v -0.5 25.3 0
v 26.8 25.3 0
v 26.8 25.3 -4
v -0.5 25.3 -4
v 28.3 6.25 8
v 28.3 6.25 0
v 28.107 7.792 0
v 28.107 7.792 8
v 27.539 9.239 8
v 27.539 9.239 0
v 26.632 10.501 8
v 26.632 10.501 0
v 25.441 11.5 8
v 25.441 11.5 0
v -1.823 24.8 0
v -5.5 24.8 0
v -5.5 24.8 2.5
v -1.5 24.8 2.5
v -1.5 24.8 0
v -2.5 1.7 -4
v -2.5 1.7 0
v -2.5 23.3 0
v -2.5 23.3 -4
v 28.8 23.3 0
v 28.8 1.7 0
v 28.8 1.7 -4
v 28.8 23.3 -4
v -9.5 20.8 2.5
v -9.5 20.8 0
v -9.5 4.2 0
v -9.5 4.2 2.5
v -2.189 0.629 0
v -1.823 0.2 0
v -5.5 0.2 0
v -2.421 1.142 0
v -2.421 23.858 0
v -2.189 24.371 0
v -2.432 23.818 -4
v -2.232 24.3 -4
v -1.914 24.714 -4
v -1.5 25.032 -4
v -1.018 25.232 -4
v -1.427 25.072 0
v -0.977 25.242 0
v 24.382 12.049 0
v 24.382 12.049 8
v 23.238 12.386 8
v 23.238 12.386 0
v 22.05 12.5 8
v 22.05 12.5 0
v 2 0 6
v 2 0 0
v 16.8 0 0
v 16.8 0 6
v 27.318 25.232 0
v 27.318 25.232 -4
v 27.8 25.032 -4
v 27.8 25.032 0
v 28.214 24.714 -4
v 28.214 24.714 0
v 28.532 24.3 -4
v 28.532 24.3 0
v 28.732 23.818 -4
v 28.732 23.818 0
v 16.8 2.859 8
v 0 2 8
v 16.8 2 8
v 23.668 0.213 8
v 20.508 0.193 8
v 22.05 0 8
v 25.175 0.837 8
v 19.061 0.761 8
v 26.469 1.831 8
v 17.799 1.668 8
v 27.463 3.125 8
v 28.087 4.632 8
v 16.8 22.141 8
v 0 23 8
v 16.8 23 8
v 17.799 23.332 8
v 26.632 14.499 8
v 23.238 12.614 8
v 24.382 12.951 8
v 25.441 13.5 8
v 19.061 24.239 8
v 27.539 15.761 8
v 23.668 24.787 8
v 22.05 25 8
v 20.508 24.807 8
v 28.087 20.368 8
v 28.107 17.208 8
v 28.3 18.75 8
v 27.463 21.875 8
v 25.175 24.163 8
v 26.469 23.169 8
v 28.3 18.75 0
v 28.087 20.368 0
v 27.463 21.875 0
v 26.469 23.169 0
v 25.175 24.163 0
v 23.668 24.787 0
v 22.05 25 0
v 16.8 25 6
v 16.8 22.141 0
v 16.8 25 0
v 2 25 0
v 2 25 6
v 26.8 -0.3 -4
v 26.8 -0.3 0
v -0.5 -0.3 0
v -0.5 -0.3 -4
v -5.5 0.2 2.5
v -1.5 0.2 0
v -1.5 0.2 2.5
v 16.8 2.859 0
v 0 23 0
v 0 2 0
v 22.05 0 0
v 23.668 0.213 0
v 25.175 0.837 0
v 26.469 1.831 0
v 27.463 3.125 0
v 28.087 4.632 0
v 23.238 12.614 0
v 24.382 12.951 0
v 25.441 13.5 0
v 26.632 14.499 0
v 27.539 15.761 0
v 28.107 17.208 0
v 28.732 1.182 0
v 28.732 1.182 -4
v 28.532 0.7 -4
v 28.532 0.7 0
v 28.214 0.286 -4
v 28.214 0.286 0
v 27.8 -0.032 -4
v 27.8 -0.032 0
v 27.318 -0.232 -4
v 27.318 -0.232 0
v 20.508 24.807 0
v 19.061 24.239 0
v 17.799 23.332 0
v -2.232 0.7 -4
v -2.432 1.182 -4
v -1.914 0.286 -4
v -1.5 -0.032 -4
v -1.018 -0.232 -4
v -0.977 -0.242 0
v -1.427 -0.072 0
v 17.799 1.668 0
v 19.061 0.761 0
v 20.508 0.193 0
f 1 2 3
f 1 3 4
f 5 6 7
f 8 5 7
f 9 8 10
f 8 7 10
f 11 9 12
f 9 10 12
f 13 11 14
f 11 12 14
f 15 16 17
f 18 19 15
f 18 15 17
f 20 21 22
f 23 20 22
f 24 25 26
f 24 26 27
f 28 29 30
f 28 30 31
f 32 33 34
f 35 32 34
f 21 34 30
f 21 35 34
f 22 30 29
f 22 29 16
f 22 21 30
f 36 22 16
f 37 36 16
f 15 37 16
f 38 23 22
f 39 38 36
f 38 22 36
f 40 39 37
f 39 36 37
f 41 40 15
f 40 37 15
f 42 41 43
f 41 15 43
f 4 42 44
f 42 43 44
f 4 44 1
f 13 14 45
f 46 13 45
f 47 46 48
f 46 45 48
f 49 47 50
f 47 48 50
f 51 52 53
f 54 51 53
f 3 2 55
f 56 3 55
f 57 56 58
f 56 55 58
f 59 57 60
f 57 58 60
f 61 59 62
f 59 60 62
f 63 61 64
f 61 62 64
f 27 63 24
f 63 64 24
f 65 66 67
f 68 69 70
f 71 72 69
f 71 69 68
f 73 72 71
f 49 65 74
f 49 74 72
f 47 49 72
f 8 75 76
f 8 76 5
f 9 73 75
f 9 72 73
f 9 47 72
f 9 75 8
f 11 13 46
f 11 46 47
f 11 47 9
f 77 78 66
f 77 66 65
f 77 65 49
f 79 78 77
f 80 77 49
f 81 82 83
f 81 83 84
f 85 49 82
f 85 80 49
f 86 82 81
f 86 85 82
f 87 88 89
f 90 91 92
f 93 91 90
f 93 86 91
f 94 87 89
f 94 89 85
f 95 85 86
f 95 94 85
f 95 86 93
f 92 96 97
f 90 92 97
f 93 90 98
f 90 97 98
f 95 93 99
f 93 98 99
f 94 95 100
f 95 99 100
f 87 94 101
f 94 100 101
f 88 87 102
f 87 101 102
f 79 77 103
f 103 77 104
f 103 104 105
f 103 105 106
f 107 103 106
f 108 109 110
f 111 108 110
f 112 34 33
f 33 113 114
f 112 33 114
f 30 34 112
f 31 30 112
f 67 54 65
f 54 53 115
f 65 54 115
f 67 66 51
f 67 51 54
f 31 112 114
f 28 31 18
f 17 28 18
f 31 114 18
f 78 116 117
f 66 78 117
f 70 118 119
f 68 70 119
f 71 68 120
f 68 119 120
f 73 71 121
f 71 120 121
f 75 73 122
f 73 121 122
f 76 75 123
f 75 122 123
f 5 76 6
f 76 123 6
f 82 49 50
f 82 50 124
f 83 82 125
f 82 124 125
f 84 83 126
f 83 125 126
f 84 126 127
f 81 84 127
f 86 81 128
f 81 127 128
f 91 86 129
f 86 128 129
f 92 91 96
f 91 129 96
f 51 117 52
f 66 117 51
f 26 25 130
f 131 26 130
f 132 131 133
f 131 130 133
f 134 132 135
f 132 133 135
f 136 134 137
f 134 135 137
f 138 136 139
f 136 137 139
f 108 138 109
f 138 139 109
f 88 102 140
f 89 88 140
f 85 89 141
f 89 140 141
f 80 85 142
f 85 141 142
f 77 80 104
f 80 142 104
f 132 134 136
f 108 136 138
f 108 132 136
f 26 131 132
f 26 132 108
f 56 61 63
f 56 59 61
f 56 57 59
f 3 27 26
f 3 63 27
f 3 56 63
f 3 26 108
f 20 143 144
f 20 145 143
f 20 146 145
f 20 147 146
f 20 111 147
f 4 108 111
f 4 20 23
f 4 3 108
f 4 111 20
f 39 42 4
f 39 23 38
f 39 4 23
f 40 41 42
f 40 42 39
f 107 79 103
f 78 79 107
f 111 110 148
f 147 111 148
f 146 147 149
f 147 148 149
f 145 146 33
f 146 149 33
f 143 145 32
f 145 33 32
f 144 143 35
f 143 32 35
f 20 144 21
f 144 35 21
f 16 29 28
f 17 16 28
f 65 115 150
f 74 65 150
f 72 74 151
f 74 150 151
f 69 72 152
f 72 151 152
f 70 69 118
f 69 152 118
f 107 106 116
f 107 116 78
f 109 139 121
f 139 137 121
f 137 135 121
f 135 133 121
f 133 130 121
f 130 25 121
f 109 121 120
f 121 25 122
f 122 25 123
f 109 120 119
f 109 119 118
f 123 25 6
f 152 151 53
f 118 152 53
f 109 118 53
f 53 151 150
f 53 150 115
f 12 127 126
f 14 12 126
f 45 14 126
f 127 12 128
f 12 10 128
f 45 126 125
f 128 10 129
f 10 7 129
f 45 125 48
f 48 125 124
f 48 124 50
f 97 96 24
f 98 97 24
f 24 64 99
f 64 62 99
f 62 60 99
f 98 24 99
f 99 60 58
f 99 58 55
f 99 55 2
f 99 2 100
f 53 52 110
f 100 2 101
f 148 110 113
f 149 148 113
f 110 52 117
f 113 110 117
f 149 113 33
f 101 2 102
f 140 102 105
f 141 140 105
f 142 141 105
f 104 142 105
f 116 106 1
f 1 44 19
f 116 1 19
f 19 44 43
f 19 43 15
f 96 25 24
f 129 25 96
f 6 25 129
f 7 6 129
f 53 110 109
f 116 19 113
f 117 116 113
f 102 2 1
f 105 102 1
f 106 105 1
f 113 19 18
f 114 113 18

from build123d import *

# Parameters (mm, degrees)
SKETCH_1_W            = 1
SKETCH_1_H            = 2
EXTRUDE_1_DEPTH       = 8
SKETCH_2_W            = 31.3
SKETCH_2_H            = 25.6
EXTRUDE_12_DEPTH      = 4
EXTRUDE_13_DEPTH      = 7
EXTRUDE_13_DEPTH_BACK = 1
SKETCH_3_W            = 2.5
SKETCH_3_H            = 24.6
CHAMFER_1_SIZE        = 4
FILLET_1_R            = 2
CHAMFER_2_SIZE        = 2


with BuildPart() as part:
    # 草图1 → 凸台-拉伸1 (new body)
    with BuildSketch(Plane.XY):
        Polygon((0, 25), (0, 0), (15.8, 0), (15.8, 6.250000037), (15.8, 11.5), (15.8, 13.5), (15.8, 18.749999979), (15.8, 25), align=None)
        with BuildLine():
            Line((16.8, 25), (15.8, 25))
            Line((15.8, 25), (15.8, 18.749999979))
            ThreePointArc((15.8, 18.749999979), (16.055210593, 20.517766943), (16.8, 22.141164992))
            Line((16.8, 22.141164992), (16.8, 25))
        make_face()
        with BuildLine():
            ThreePointArc((16.8, 22.141164992), (16.055210593, 20.517766943), (15.8, 18.749999979))
            ThreePointArc((15.8, 18.749999979), (16.055210599, 16.982233037), (16.8, 15.358835008))
            Line((16.8, 15.358835008), (16.8, 22.141164992))
        make_face()
        with BuildLine():
            ThreePointArc((16.8, 15.358835008), (16.055210599, 16.982233037), (15.8, 18.749999979))
            Line((15.8, 18.749999979), (15.8, 13.5))
            Line((15.8, 13.5), (16.8, 13.5))
            Line((16.8, 13.5), (16.8, 15.358835008))
        make_face()
        with BuildLine():
            ThreePointArc((28.3, 18.75), (26.469417382, 23.169417382), (22.05, 25))
            ThreePointArc((22.05, 25), (19.061043761, 24.238956239), (16.8, 22.141164992))
            Line((16.8, 22.141164992), (16.8, 15.358835008))
            ThreePointArc((16.8, 15.358835008), (17.630582618, 14.330582618), (18.658835008, 13.5))
            Line((18.658835008, 13.5), (25.441164992, 13.5))
            ThreePointArc((25.441164992, 13.5), (27.538956239, 15.761043761), (28.3, 18.75))
        make_face()
        with BuildLine():
            ThreePointArc((18.658835008, 13.5), (17.630582618, 14.330582618), (16.8, 15.358835008))
            Line((16.8, 15.358835008), (16.8, 13.5))
            Line((16.8, 13.5), (18.658835008, 13.5))
        make_face()
        with BuildLine():
            ThreePointArc((16.8, 2.858835008), (19.061043761, 0.761043761), (22.05, 0))
            ThreePointArc((22.05, 0), (26.469417382, 1.830582618), (28.3, 6.25))
            ThreePointArc((28.3, 6.25), (27.538956239, 9.238956239), (25.441164992, 11.5))
            Line((25.441164992, 11.5), (18.658835008, 11.5))
            ThreePointArc((18.658835008, 11.5), (17.630582618, 10.669417382), (16.8, 9.641164992))
            Line((16.8, 9.641164992), (16.8, 2.858835008))
        make_face()
        with BuildLine():
            Line((16.8, 11.5), (16.8, 9.641164992))
            ThreePointArc((16.8, 9.641164992), (17.630582618, 10.669417382), (18.658835008, 11.5))
            Line((18.658835008, 11.5), (16.8, 11.5))
        make_face()
        with BuildLine():
            Line((16.8, 13.5), (16.8, 11.5))
            Line((16.8, 11.5), (18.658835008, 11.5))
            ThreePointArc((18.658835008, 11.5), (20.282233047, 12.244789404), (22.05, 12.5))
            ThreePointArc((22.05, 12.5), (20.282233047, 12.755210596), (18.658835008, 13.5))
            Line((18.658835008, 13.5), (16.8, 13.5))
        make_face()
        with Locations((16.3, 12.5)):
            Rectangle(SKETCH_1_W, SKETCH_1_H)
        with BuildLine():
            ThreePointArc((16.8, 9.641164992), (16.055210601, 8.017766971), (15.8, 6.250000037))
            ThreePointArc((15.8, 6.250000037), (16.055210591, 4.482233065), (16.8, 2.858835008))
            Line((16.8, 2.858835008), (16.8, 9.641164992))
        make_face()
        with BuildLine():
            Line((15.8, 11.5), (15.8, 6.250000037))
            ThreePointArc((15.8, 6.250000037), (16.055210601, 8.017766971), (16.8, 9.641164992))
            Line((16.8, 9.641164992), (16.8, 11.5))
            Line((16.8, 11.5), (15.8, 11.5))
        make_face()
        with BuildLine():
            Line((15.8, 6.250000037), (15.8, 0))
            Line((15.8, 0), (16.8, 0))
            Line((16.8, 0), (16.8, 2.858835008))
            ThreePointArc((16.8, 2.858835008), (16.055210591, 4.482233065), (15.8, 6.250000037))
        make_face()
        with BuildLine():
            ThreePointArc((22.05, 12.5), (20.282233047, 12.244789404), (18.658835008, 11.5))
            Line((18.658835008, 11.5), (25.441164992, 11.5))
            ThreePointArc((25.441164992, 11.5), (23.817766953, 12.244789404), (22.05, 12.5))
        make_face()
        with BuildLine():
            ThreePointArc((18.658835008, 13.5), (20.282233047, 12.755210596), (22.05, 12.5))
            ThreePointArc((22.05, 12.5), (23.817766953, 12.755210596), (25.441164992, 13.5))
            Line((25.441164992, 13.5), (18.658835008, 13.5))
        make_face()
    extrude(amount=EXTRUDE_1_DEPTH)

    # 草图2 → 凸台-拉伸12 (add)
    with BuildSketch(Plane(origin=(0, 0, 0), x_dir=(-1, 0, 0), z_dir=(0, 0, -1))):
        with Locations((-13.15, 12.5)):
            Rectangle(SKETCH_2_W, SKETCH_2_H)
    extrude(amount=EXTRUDE_12_DEPTH)

    # 草图3 → 凸台-拉伸13 (add, two sides: drawn at the far end of the back side and taken through both)
    with BuildSketch(Plane.ZY.offset(2.5).offset(-EXTRUDE_13_DEPTH_BACK)):
        with Locations((1.25, 12.5)):
            Rectangle(SKETCH_3_W, SKETCH_3_H)
    extrude(amount=EXTRUDE_13_DEPTH + EXTRUDE_13_DEPTH_BACK)

    # 倒角1
    chamfer_1_edges = [part.edges().sort_by_distance(p)[0] for p in [
        (-9.5, 0.2, 1.25),
        (-9.5, 24.8, 1.25),
    ]]
    chamfer(chamfer_1_edges, length=CHAMFER_1_SIZE)

    # 圆角1
    # the kernel refuses this fillet: 2 mm, written as the material it takes off along each edge
    with BuildSketch(Plane(origin=(-2.5, -0.3, 0), x_dir=(0, 1, 0), z_dir=(0, 0, -1))) as fillet_1_piece_1:
        with BuildLine():
            CenterArc((FILLET_1_R, FILLET_1_R), FILLET_1_R, 180, 90)
            Line((0, FILLET_1_R), (0, 0))
            Line((0, 0), (FILLET_1_R, 0))
        make_face()
    extrude(amount=9, mode=Mode.SUBTRACT)
    with BuildSketch(Plane(origin=(-2.5, 25.3, 0), x_dir=(0, -1, 0), z_dir=(0, 0, -1))) as fillet_1_piece_2:
        with BuildLine():
            CenterArc((FILLET_1_R, -FILLET_1_R), FILLET_1_R, 90, 90)
            Line((0, -FILLET_1_R), (0, 0))
            Line((0, 0), (FILLET_1_R, 0))
        make_face()
    extrude(amount=9, mode=Mode.SUBTRACT)
    with BuildSketch(Plane(origin=(28.8, 25.3, 5), x_dir=(-1, 0, 0), z_dir=(0, 0, -1))) as fillet_1_piece_3:
        with BuildLine():
            CenterArc((FILLET_1_R, -FILLET_1_R), FILLET_1_R, 90, 90)
            Line((0, -FILLET_1_R), (0, 0))
            Line((0, 0), (FILLET_1_R, 0))
        make_face()
    extrude(amount=14, mode=Mode.SUBTRACT)
    with BuildSketch(Plane(origin=(28.8, -0.3, 5), x_dir=(-1, 0, 0), z_dir=(0, 0, -1))) as fillet_1_piece_4:
        with BuildLine():
            CenterArc((FILLET_1_R, FILLET_1_R), FILLET_1_R, 180, 90)
            Line((0, FILLET_1_R), (0, 0))
            Line((0, 0), (FILLET_1_R, 0))
        make_face()
    extrude(amount=14, mode=Mode.SUBTRACT)

    # 倒角2
    chamfer_2_edges = [part.edges().sort_by_distance(p)[0] for p in [
        (0, 0, 4),
        (0, 25, 4),
        (8.4, 25, 8),
        (8.4, 0, 8),
    ]]
    chamfer(chamfer_2_edges, length=CHAMFER_2_SIZE)


solid = part.part
